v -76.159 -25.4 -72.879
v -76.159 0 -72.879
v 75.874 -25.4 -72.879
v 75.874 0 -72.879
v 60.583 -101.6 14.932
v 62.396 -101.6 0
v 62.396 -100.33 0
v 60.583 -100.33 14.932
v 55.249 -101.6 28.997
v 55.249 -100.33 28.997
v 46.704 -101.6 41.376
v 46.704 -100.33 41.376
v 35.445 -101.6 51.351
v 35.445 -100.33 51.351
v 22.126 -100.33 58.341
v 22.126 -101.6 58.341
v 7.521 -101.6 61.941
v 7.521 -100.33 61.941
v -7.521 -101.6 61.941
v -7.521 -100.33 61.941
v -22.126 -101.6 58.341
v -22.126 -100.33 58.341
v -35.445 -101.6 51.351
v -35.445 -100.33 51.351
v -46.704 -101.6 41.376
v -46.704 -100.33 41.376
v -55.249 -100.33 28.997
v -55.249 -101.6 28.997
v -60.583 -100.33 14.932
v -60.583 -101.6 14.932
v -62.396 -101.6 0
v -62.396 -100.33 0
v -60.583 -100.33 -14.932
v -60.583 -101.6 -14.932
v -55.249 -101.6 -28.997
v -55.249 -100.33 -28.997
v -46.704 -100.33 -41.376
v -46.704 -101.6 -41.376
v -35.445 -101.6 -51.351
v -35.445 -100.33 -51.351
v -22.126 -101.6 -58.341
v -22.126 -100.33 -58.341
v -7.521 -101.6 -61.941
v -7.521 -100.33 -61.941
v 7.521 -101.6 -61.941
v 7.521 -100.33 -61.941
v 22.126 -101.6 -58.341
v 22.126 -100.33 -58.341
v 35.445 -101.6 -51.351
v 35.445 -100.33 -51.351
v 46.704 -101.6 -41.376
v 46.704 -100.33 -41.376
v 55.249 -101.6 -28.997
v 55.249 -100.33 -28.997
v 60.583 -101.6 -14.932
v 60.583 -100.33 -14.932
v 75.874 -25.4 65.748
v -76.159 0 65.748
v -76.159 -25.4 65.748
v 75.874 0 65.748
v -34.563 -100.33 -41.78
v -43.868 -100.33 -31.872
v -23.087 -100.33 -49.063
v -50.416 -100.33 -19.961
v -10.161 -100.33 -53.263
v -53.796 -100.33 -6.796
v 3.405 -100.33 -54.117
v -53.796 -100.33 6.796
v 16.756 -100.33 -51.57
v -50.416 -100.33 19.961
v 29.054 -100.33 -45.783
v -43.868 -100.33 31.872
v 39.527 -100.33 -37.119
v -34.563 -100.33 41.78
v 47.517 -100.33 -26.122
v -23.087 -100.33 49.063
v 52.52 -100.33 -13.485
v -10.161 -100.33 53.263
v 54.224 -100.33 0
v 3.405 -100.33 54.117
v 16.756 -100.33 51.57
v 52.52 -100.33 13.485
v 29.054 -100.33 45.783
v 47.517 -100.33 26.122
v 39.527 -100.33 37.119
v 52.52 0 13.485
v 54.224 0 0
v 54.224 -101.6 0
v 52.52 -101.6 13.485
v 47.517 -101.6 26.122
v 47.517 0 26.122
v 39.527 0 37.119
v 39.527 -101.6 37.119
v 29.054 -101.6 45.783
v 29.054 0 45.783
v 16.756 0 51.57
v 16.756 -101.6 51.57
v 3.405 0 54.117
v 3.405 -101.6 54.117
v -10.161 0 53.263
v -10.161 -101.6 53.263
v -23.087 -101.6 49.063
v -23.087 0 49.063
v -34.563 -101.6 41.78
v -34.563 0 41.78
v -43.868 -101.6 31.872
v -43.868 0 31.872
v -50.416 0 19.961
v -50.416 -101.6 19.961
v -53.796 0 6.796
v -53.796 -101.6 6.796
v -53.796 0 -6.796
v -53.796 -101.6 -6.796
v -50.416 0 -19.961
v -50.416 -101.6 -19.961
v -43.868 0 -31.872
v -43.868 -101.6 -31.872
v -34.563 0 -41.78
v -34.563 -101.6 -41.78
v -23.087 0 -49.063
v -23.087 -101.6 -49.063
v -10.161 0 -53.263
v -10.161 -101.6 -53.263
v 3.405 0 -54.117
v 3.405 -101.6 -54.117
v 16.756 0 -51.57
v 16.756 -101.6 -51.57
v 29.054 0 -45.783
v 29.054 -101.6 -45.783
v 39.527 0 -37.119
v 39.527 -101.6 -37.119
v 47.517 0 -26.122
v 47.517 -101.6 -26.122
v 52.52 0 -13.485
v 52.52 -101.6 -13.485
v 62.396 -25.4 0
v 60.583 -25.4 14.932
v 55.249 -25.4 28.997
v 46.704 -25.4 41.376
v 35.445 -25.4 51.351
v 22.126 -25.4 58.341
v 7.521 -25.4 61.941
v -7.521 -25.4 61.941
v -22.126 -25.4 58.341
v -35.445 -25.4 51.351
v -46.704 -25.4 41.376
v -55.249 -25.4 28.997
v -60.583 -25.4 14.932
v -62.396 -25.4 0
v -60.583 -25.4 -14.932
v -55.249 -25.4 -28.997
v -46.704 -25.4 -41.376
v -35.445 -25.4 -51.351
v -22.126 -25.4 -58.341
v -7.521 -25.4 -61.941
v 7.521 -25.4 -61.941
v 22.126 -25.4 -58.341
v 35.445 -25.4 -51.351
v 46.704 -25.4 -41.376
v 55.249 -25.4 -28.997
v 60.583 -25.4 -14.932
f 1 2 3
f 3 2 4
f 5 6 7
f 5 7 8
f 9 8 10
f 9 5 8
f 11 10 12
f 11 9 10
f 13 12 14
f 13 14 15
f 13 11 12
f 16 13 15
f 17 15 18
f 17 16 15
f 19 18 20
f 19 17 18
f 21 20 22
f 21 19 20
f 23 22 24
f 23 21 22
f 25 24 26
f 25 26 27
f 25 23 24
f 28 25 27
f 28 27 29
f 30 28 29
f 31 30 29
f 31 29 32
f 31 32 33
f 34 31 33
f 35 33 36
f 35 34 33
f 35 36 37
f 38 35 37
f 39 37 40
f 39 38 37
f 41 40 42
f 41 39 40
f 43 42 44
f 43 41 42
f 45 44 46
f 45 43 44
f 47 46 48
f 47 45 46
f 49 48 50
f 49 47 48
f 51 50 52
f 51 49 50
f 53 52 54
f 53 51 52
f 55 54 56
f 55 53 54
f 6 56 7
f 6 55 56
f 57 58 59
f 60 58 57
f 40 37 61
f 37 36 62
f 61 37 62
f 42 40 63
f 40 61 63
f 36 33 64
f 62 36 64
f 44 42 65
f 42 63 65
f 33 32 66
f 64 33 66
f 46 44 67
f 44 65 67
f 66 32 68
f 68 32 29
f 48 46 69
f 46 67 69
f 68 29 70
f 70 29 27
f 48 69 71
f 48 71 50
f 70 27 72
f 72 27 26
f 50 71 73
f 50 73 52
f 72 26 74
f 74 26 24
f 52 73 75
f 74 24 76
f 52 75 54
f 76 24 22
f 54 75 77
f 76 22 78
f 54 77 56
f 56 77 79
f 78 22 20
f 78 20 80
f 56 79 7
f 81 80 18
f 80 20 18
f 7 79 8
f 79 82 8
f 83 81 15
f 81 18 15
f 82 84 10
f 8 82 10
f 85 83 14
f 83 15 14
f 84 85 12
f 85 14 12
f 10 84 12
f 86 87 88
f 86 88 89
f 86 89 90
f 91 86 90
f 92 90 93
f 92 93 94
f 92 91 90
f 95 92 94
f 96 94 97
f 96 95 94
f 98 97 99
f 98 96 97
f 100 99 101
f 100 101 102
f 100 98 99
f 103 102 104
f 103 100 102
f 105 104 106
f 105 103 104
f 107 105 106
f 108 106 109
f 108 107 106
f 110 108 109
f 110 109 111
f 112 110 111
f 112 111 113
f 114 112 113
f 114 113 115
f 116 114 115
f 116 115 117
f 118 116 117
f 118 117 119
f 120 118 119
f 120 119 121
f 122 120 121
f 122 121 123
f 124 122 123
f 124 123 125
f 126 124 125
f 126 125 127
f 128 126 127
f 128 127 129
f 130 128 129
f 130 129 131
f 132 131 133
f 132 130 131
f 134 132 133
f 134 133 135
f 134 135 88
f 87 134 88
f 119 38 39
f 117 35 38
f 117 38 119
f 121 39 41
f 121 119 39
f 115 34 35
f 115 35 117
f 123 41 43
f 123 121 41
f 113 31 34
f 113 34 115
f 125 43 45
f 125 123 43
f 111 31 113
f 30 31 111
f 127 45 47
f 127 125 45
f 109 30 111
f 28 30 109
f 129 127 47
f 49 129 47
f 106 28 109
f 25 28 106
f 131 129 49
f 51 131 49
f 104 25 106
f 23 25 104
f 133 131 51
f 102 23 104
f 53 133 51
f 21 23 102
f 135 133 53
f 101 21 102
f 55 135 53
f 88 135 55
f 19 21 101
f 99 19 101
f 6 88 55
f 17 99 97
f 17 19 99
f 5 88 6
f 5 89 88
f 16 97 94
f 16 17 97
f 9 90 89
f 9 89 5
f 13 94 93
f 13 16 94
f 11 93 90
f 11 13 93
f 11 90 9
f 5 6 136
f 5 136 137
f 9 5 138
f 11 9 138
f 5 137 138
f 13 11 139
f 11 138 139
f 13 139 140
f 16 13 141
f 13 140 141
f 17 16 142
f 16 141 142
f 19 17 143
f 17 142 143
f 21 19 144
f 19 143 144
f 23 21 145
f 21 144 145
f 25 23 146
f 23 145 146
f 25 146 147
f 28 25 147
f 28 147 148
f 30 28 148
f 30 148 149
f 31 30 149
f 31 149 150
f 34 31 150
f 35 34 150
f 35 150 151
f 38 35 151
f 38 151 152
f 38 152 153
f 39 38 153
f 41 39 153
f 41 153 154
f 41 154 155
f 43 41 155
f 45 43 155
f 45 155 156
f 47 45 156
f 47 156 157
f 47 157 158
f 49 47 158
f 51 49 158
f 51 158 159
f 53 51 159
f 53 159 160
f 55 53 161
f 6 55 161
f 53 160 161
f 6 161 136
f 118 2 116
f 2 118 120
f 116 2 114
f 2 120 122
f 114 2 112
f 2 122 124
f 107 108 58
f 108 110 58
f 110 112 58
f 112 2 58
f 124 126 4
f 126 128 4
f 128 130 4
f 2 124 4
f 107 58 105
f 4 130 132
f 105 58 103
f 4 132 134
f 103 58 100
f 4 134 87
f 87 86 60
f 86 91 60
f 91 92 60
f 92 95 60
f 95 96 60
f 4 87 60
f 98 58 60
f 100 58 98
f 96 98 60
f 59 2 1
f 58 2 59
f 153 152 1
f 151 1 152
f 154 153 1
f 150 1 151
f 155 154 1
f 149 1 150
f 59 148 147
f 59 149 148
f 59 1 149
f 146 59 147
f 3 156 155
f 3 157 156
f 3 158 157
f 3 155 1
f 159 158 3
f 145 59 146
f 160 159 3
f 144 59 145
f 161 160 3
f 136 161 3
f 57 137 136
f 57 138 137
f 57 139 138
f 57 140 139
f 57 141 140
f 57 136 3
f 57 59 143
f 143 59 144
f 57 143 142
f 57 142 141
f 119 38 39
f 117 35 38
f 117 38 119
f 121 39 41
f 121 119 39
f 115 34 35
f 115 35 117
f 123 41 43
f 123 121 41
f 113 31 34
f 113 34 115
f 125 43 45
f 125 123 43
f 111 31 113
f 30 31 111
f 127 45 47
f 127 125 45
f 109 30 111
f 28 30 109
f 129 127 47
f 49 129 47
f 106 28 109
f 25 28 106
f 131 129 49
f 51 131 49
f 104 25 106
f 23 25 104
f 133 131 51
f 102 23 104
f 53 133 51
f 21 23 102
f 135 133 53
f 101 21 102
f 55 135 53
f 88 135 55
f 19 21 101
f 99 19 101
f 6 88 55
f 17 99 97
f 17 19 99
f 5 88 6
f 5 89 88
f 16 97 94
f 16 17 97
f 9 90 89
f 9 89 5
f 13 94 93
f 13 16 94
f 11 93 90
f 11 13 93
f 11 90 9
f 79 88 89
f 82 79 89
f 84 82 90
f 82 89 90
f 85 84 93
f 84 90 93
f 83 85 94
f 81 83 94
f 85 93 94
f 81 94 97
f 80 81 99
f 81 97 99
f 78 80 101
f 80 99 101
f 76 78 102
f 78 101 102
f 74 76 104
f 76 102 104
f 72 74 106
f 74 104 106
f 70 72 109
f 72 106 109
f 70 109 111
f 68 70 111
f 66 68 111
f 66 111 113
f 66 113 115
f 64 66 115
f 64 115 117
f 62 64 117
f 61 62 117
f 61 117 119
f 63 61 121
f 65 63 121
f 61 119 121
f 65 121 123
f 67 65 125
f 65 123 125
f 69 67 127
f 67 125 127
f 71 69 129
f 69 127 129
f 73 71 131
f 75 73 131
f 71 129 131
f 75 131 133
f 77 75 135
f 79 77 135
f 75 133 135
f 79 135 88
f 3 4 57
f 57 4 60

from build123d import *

# Parameters (mm, degrees)
F0_R        = 62.3961855018
F0_R_2      = 54.2236772846
F1_DEPTH    = 25.4
F2_DEPTH    = 50.8
F0_W        = 152.0332619548
F0_H        = 138.626947999
F2_FACE_R   = 62.3961855018
F2_FACE_R_2 = 54.2236772846
F3_DEPTH    = 25.4
F4_DEPTH    = 1.27


with BuildPart() as f1:
    # F0 (on Front) → F1 (new body)
    with BuildSketch(Plane.XZ):
        Circle(F0_R)
        Circle(F0_R_2, mode=Mode.SUBTRACT)
    extrude(amount=F1_DEPTH)

    # F2 (add): faces of the model
    f2_faces = [f1.faces().sort_by_distance(p)[0] for p in [
        (-60.6313548663, -25.4, 0),
        (-60.6313548663, 0, 0),
    ]]
    extrude(f2_faces, amount=F2_DEPTH, dir=(0, -1, 0))

    # F0 (on Front) + F2_face (on face) → F3 (join)
    with BuildSketch(Plane.XZ):
        with Locations((-0.1426227391, -3.565505147)):
            Rectangle(F0_W, F0_H)
        Circle(F0_R, mode=Mode.SUBTRACT)
    with BuildSketch(Plane.XZ.offset(76.2)):
        Circle(F2_FACE_R)
        Circle(F2_FACE_R_2, mode=Mode.SUBTRACT)
    extrude(amount=F3_DEPTH)


with BuildPart() as f4:
    # F4 (new): a face of the model
    f4_faces = [f1.part.faces().sort_by_distance(p)[0] for p in [
        (-60.6313548663, -101.6, 0),
    ]]
    extrude(f4_faces, amount=-F4_DEPTH)


solid = Compound([f1.part, f4.part])
